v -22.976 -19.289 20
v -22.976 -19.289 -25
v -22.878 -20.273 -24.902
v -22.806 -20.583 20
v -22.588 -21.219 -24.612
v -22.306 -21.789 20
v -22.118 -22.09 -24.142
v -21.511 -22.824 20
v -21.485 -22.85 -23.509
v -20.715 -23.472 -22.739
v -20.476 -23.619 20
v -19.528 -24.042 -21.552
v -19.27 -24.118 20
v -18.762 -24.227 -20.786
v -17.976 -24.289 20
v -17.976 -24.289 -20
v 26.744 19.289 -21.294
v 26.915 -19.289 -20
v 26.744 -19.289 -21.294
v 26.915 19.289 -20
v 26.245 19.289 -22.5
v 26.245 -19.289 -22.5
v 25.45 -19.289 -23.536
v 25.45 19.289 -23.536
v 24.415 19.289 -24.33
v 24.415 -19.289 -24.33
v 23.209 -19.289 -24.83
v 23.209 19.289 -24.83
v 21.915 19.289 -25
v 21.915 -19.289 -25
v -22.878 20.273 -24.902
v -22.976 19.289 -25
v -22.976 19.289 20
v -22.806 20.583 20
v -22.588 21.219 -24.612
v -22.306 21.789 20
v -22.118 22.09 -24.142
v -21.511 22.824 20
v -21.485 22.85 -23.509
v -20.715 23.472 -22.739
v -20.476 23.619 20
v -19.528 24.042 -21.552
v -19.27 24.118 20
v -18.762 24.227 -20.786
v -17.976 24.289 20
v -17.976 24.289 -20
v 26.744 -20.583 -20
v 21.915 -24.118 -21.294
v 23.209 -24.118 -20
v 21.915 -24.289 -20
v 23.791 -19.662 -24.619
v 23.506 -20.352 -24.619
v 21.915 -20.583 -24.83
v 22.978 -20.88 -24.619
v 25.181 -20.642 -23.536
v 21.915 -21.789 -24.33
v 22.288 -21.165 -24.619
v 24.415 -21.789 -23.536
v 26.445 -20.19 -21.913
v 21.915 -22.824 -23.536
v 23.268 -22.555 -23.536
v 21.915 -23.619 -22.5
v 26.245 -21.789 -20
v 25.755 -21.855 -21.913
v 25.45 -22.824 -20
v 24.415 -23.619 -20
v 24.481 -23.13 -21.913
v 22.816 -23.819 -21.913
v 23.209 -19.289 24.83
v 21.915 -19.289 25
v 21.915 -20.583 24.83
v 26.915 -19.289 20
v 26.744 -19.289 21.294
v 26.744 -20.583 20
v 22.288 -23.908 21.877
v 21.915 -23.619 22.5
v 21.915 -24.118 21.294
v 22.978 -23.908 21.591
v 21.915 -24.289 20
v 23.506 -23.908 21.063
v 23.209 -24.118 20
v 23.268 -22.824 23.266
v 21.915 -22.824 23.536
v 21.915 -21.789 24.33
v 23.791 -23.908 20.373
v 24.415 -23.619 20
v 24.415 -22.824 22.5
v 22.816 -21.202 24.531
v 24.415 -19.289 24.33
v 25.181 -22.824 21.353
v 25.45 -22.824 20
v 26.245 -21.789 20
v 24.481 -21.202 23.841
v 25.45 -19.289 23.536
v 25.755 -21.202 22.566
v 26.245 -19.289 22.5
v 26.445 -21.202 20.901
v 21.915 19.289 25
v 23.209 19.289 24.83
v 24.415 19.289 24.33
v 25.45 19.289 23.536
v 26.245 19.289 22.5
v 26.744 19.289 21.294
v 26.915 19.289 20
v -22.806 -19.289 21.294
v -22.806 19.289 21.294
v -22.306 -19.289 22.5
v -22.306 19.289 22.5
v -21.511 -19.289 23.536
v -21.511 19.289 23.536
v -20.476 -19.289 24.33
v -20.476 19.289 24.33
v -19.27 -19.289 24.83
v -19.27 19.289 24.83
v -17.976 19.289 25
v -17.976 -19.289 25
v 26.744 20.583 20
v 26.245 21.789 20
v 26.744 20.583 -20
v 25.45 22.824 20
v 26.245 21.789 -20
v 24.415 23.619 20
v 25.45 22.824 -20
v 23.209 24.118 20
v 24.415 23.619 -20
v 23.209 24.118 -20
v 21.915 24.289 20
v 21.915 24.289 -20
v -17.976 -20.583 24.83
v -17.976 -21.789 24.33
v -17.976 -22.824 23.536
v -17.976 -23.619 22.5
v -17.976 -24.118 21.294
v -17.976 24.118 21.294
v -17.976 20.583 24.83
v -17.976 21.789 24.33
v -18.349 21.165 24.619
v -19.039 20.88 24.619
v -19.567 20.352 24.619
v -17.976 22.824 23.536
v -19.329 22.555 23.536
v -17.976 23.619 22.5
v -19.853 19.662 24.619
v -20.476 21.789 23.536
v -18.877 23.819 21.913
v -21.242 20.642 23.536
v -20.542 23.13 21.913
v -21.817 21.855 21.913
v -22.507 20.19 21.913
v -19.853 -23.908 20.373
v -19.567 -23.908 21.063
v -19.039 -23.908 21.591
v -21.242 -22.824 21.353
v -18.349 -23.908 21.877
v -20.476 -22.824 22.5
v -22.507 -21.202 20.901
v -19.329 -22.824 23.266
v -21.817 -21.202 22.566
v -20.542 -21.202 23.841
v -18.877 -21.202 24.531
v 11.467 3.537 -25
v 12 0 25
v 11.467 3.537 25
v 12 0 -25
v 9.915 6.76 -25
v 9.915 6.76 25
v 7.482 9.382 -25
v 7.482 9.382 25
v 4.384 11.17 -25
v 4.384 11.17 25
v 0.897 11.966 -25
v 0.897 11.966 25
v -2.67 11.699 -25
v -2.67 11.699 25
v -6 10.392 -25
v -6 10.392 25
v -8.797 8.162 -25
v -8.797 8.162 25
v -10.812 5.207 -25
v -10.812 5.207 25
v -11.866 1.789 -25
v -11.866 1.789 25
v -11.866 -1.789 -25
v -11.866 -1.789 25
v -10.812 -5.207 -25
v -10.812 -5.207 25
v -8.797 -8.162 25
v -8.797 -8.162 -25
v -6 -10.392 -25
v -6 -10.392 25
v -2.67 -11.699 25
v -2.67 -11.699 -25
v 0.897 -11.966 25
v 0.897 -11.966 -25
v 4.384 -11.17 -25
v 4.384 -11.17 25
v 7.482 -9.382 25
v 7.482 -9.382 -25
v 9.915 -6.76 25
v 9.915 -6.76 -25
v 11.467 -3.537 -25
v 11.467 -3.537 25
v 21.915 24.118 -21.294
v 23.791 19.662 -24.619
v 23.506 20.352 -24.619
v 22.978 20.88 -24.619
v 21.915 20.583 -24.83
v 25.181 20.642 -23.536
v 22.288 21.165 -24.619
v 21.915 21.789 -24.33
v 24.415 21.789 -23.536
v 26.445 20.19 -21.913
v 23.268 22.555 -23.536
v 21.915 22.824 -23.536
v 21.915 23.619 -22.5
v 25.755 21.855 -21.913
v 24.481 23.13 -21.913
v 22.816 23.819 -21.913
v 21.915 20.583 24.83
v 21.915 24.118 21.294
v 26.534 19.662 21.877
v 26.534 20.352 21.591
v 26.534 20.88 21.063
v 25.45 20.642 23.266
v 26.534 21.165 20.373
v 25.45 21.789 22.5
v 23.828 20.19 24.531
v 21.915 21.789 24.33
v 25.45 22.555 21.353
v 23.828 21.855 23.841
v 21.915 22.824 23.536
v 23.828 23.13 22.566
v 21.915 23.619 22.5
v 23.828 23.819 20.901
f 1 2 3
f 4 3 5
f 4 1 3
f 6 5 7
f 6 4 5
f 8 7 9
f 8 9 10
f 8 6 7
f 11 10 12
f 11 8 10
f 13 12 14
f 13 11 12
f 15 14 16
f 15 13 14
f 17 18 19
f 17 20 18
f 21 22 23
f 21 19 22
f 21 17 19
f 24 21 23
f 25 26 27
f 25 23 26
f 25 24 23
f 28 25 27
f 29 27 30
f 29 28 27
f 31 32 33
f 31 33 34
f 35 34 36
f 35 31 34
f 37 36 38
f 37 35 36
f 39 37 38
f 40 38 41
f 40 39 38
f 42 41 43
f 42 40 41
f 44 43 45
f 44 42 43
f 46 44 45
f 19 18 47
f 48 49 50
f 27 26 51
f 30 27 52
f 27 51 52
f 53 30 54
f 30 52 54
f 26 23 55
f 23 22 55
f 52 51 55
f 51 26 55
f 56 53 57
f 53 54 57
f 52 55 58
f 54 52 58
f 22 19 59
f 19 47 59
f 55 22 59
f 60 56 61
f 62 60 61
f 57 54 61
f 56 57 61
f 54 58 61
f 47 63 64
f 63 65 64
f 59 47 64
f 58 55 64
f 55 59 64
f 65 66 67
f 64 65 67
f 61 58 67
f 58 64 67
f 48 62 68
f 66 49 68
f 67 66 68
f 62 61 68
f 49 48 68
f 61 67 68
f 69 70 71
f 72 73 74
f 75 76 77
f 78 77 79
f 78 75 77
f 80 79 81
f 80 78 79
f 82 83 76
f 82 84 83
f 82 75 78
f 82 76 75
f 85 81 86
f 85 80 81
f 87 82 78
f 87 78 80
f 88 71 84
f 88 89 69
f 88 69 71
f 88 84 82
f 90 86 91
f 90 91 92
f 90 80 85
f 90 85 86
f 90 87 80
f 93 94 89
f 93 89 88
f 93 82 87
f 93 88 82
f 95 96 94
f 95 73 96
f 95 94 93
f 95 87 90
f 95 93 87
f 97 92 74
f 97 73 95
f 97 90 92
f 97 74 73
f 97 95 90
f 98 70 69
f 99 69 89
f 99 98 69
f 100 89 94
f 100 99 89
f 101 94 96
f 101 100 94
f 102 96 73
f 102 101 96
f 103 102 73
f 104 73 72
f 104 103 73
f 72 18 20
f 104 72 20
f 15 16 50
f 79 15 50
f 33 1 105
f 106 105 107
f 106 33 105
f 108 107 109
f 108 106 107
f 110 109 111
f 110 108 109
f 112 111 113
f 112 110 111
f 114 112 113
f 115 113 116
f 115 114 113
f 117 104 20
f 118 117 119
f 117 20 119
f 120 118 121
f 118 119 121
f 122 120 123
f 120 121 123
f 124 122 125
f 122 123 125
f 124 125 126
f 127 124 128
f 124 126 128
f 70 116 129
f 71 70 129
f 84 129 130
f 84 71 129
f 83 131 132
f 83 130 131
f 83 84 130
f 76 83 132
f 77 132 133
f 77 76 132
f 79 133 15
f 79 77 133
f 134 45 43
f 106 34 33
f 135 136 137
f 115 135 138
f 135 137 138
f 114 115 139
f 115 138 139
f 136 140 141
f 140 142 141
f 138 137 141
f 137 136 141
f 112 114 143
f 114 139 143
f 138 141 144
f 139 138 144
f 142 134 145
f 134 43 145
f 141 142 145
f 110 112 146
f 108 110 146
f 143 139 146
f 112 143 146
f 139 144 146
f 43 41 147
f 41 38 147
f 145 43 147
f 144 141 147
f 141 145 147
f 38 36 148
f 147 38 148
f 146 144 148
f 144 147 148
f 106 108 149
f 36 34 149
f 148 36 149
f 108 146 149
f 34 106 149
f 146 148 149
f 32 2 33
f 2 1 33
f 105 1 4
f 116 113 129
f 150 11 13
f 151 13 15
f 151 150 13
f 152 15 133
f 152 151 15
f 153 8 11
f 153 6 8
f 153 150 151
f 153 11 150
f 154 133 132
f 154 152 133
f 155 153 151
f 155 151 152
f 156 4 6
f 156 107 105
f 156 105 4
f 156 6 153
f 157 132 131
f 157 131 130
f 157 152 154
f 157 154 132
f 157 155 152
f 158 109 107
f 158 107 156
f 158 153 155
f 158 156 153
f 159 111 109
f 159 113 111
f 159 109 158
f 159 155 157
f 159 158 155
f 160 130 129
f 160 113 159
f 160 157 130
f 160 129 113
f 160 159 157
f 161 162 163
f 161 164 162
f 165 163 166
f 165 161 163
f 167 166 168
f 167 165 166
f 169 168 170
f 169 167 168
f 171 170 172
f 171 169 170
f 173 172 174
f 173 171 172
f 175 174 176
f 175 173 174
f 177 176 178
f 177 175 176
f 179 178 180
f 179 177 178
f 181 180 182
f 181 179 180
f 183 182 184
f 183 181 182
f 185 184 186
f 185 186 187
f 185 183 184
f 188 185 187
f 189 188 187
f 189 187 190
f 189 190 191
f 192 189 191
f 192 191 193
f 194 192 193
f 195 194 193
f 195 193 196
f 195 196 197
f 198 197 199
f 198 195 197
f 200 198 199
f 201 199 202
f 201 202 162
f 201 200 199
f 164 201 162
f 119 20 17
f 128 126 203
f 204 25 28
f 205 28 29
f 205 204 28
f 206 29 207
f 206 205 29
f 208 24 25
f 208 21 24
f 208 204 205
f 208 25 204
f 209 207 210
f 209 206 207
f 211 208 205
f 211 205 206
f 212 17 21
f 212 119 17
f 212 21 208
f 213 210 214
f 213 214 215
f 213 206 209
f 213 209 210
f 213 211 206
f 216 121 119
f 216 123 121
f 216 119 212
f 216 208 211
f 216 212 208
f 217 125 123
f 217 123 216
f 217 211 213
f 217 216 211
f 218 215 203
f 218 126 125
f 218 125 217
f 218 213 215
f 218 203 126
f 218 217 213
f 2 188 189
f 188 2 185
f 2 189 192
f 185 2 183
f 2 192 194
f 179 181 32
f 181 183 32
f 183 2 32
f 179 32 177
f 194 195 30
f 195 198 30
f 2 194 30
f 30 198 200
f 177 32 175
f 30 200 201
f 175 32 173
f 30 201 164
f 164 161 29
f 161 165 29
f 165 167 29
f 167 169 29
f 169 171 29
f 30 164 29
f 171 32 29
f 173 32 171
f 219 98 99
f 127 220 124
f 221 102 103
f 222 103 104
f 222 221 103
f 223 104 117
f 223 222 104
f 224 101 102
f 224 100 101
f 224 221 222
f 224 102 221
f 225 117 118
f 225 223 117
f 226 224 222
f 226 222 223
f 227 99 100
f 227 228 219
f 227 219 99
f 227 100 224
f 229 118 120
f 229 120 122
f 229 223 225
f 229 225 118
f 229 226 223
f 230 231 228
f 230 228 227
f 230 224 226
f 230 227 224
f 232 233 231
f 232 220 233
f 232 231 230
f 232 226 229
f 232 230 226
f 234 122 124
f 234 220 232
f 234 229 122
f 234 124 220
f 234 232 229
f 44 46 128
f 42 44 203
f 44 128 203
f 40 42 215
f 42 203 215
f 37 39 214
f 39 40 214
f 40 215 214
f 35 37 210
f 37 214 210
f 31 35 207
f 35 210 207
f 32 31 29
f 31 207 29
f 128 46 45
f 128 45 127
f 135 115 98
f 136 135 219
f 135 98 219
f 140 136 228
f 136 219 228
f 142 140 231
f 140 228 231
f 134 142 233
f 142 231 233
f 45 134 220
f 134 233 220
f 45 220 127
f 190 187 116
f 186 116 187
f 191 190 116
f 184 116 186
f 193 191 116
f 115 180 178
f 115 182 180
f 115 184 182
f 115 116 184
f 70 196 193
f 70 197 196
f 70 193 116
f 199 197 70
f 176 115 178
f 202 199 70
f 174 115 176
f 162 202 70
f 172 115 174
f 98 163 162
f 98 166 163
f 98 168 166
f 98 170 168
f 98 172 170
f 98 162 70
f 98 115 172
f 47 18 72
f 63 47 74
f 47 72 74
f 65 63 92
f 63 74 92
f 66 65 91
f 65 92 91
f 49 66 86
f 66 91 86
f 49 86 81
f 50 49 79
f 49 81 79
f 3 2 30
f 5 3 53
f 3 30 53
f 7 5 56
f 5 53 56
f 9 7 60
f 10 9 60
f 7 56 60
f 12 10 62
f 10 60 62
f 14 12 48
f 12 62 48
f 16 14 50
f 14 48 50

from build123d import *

# Parameters (mm, degrees)
F0_W     = 49.890485
F0_H     = 48.57757
F0_R     = 12
F1_DEPTH = 25
F2_R     = 5


with BuildPart() as f1:
    # F0 (on Top) → F1 (new body, symmetric)
    with BuildSketch(Plane.XY):
        with Locations((1.969362, 0)):
            Rectangle(F0_W, F0_H)
        Circle(F0_R, mode=Mode.SUBTRACT)
    extrude(amount=F1_DEPTH, both=True)

    # F2
    f2_edges = [f1.edges().sort_by_distance(p)[0] for p in [
        (-22.97588, 24.288785, 0),
        (1.969363, 24.288785, 25),
        (-22.97588, 0, 25),
        (-22.97588, -24.288785, 0),
        (26.914605, 0, 25),
        (1.969363, -24.288785, 25),
        (26.914605, 24.288785, 0),
        (26.914605, -24.288785, 0),
        (26.914605, 0, -25),
        (1.969363, 24.288785, -25),
        (1.969363, -24.288785, -25),
    ]]
    fillet(f2_edges, radius=F2_R)


solid = f1.part
